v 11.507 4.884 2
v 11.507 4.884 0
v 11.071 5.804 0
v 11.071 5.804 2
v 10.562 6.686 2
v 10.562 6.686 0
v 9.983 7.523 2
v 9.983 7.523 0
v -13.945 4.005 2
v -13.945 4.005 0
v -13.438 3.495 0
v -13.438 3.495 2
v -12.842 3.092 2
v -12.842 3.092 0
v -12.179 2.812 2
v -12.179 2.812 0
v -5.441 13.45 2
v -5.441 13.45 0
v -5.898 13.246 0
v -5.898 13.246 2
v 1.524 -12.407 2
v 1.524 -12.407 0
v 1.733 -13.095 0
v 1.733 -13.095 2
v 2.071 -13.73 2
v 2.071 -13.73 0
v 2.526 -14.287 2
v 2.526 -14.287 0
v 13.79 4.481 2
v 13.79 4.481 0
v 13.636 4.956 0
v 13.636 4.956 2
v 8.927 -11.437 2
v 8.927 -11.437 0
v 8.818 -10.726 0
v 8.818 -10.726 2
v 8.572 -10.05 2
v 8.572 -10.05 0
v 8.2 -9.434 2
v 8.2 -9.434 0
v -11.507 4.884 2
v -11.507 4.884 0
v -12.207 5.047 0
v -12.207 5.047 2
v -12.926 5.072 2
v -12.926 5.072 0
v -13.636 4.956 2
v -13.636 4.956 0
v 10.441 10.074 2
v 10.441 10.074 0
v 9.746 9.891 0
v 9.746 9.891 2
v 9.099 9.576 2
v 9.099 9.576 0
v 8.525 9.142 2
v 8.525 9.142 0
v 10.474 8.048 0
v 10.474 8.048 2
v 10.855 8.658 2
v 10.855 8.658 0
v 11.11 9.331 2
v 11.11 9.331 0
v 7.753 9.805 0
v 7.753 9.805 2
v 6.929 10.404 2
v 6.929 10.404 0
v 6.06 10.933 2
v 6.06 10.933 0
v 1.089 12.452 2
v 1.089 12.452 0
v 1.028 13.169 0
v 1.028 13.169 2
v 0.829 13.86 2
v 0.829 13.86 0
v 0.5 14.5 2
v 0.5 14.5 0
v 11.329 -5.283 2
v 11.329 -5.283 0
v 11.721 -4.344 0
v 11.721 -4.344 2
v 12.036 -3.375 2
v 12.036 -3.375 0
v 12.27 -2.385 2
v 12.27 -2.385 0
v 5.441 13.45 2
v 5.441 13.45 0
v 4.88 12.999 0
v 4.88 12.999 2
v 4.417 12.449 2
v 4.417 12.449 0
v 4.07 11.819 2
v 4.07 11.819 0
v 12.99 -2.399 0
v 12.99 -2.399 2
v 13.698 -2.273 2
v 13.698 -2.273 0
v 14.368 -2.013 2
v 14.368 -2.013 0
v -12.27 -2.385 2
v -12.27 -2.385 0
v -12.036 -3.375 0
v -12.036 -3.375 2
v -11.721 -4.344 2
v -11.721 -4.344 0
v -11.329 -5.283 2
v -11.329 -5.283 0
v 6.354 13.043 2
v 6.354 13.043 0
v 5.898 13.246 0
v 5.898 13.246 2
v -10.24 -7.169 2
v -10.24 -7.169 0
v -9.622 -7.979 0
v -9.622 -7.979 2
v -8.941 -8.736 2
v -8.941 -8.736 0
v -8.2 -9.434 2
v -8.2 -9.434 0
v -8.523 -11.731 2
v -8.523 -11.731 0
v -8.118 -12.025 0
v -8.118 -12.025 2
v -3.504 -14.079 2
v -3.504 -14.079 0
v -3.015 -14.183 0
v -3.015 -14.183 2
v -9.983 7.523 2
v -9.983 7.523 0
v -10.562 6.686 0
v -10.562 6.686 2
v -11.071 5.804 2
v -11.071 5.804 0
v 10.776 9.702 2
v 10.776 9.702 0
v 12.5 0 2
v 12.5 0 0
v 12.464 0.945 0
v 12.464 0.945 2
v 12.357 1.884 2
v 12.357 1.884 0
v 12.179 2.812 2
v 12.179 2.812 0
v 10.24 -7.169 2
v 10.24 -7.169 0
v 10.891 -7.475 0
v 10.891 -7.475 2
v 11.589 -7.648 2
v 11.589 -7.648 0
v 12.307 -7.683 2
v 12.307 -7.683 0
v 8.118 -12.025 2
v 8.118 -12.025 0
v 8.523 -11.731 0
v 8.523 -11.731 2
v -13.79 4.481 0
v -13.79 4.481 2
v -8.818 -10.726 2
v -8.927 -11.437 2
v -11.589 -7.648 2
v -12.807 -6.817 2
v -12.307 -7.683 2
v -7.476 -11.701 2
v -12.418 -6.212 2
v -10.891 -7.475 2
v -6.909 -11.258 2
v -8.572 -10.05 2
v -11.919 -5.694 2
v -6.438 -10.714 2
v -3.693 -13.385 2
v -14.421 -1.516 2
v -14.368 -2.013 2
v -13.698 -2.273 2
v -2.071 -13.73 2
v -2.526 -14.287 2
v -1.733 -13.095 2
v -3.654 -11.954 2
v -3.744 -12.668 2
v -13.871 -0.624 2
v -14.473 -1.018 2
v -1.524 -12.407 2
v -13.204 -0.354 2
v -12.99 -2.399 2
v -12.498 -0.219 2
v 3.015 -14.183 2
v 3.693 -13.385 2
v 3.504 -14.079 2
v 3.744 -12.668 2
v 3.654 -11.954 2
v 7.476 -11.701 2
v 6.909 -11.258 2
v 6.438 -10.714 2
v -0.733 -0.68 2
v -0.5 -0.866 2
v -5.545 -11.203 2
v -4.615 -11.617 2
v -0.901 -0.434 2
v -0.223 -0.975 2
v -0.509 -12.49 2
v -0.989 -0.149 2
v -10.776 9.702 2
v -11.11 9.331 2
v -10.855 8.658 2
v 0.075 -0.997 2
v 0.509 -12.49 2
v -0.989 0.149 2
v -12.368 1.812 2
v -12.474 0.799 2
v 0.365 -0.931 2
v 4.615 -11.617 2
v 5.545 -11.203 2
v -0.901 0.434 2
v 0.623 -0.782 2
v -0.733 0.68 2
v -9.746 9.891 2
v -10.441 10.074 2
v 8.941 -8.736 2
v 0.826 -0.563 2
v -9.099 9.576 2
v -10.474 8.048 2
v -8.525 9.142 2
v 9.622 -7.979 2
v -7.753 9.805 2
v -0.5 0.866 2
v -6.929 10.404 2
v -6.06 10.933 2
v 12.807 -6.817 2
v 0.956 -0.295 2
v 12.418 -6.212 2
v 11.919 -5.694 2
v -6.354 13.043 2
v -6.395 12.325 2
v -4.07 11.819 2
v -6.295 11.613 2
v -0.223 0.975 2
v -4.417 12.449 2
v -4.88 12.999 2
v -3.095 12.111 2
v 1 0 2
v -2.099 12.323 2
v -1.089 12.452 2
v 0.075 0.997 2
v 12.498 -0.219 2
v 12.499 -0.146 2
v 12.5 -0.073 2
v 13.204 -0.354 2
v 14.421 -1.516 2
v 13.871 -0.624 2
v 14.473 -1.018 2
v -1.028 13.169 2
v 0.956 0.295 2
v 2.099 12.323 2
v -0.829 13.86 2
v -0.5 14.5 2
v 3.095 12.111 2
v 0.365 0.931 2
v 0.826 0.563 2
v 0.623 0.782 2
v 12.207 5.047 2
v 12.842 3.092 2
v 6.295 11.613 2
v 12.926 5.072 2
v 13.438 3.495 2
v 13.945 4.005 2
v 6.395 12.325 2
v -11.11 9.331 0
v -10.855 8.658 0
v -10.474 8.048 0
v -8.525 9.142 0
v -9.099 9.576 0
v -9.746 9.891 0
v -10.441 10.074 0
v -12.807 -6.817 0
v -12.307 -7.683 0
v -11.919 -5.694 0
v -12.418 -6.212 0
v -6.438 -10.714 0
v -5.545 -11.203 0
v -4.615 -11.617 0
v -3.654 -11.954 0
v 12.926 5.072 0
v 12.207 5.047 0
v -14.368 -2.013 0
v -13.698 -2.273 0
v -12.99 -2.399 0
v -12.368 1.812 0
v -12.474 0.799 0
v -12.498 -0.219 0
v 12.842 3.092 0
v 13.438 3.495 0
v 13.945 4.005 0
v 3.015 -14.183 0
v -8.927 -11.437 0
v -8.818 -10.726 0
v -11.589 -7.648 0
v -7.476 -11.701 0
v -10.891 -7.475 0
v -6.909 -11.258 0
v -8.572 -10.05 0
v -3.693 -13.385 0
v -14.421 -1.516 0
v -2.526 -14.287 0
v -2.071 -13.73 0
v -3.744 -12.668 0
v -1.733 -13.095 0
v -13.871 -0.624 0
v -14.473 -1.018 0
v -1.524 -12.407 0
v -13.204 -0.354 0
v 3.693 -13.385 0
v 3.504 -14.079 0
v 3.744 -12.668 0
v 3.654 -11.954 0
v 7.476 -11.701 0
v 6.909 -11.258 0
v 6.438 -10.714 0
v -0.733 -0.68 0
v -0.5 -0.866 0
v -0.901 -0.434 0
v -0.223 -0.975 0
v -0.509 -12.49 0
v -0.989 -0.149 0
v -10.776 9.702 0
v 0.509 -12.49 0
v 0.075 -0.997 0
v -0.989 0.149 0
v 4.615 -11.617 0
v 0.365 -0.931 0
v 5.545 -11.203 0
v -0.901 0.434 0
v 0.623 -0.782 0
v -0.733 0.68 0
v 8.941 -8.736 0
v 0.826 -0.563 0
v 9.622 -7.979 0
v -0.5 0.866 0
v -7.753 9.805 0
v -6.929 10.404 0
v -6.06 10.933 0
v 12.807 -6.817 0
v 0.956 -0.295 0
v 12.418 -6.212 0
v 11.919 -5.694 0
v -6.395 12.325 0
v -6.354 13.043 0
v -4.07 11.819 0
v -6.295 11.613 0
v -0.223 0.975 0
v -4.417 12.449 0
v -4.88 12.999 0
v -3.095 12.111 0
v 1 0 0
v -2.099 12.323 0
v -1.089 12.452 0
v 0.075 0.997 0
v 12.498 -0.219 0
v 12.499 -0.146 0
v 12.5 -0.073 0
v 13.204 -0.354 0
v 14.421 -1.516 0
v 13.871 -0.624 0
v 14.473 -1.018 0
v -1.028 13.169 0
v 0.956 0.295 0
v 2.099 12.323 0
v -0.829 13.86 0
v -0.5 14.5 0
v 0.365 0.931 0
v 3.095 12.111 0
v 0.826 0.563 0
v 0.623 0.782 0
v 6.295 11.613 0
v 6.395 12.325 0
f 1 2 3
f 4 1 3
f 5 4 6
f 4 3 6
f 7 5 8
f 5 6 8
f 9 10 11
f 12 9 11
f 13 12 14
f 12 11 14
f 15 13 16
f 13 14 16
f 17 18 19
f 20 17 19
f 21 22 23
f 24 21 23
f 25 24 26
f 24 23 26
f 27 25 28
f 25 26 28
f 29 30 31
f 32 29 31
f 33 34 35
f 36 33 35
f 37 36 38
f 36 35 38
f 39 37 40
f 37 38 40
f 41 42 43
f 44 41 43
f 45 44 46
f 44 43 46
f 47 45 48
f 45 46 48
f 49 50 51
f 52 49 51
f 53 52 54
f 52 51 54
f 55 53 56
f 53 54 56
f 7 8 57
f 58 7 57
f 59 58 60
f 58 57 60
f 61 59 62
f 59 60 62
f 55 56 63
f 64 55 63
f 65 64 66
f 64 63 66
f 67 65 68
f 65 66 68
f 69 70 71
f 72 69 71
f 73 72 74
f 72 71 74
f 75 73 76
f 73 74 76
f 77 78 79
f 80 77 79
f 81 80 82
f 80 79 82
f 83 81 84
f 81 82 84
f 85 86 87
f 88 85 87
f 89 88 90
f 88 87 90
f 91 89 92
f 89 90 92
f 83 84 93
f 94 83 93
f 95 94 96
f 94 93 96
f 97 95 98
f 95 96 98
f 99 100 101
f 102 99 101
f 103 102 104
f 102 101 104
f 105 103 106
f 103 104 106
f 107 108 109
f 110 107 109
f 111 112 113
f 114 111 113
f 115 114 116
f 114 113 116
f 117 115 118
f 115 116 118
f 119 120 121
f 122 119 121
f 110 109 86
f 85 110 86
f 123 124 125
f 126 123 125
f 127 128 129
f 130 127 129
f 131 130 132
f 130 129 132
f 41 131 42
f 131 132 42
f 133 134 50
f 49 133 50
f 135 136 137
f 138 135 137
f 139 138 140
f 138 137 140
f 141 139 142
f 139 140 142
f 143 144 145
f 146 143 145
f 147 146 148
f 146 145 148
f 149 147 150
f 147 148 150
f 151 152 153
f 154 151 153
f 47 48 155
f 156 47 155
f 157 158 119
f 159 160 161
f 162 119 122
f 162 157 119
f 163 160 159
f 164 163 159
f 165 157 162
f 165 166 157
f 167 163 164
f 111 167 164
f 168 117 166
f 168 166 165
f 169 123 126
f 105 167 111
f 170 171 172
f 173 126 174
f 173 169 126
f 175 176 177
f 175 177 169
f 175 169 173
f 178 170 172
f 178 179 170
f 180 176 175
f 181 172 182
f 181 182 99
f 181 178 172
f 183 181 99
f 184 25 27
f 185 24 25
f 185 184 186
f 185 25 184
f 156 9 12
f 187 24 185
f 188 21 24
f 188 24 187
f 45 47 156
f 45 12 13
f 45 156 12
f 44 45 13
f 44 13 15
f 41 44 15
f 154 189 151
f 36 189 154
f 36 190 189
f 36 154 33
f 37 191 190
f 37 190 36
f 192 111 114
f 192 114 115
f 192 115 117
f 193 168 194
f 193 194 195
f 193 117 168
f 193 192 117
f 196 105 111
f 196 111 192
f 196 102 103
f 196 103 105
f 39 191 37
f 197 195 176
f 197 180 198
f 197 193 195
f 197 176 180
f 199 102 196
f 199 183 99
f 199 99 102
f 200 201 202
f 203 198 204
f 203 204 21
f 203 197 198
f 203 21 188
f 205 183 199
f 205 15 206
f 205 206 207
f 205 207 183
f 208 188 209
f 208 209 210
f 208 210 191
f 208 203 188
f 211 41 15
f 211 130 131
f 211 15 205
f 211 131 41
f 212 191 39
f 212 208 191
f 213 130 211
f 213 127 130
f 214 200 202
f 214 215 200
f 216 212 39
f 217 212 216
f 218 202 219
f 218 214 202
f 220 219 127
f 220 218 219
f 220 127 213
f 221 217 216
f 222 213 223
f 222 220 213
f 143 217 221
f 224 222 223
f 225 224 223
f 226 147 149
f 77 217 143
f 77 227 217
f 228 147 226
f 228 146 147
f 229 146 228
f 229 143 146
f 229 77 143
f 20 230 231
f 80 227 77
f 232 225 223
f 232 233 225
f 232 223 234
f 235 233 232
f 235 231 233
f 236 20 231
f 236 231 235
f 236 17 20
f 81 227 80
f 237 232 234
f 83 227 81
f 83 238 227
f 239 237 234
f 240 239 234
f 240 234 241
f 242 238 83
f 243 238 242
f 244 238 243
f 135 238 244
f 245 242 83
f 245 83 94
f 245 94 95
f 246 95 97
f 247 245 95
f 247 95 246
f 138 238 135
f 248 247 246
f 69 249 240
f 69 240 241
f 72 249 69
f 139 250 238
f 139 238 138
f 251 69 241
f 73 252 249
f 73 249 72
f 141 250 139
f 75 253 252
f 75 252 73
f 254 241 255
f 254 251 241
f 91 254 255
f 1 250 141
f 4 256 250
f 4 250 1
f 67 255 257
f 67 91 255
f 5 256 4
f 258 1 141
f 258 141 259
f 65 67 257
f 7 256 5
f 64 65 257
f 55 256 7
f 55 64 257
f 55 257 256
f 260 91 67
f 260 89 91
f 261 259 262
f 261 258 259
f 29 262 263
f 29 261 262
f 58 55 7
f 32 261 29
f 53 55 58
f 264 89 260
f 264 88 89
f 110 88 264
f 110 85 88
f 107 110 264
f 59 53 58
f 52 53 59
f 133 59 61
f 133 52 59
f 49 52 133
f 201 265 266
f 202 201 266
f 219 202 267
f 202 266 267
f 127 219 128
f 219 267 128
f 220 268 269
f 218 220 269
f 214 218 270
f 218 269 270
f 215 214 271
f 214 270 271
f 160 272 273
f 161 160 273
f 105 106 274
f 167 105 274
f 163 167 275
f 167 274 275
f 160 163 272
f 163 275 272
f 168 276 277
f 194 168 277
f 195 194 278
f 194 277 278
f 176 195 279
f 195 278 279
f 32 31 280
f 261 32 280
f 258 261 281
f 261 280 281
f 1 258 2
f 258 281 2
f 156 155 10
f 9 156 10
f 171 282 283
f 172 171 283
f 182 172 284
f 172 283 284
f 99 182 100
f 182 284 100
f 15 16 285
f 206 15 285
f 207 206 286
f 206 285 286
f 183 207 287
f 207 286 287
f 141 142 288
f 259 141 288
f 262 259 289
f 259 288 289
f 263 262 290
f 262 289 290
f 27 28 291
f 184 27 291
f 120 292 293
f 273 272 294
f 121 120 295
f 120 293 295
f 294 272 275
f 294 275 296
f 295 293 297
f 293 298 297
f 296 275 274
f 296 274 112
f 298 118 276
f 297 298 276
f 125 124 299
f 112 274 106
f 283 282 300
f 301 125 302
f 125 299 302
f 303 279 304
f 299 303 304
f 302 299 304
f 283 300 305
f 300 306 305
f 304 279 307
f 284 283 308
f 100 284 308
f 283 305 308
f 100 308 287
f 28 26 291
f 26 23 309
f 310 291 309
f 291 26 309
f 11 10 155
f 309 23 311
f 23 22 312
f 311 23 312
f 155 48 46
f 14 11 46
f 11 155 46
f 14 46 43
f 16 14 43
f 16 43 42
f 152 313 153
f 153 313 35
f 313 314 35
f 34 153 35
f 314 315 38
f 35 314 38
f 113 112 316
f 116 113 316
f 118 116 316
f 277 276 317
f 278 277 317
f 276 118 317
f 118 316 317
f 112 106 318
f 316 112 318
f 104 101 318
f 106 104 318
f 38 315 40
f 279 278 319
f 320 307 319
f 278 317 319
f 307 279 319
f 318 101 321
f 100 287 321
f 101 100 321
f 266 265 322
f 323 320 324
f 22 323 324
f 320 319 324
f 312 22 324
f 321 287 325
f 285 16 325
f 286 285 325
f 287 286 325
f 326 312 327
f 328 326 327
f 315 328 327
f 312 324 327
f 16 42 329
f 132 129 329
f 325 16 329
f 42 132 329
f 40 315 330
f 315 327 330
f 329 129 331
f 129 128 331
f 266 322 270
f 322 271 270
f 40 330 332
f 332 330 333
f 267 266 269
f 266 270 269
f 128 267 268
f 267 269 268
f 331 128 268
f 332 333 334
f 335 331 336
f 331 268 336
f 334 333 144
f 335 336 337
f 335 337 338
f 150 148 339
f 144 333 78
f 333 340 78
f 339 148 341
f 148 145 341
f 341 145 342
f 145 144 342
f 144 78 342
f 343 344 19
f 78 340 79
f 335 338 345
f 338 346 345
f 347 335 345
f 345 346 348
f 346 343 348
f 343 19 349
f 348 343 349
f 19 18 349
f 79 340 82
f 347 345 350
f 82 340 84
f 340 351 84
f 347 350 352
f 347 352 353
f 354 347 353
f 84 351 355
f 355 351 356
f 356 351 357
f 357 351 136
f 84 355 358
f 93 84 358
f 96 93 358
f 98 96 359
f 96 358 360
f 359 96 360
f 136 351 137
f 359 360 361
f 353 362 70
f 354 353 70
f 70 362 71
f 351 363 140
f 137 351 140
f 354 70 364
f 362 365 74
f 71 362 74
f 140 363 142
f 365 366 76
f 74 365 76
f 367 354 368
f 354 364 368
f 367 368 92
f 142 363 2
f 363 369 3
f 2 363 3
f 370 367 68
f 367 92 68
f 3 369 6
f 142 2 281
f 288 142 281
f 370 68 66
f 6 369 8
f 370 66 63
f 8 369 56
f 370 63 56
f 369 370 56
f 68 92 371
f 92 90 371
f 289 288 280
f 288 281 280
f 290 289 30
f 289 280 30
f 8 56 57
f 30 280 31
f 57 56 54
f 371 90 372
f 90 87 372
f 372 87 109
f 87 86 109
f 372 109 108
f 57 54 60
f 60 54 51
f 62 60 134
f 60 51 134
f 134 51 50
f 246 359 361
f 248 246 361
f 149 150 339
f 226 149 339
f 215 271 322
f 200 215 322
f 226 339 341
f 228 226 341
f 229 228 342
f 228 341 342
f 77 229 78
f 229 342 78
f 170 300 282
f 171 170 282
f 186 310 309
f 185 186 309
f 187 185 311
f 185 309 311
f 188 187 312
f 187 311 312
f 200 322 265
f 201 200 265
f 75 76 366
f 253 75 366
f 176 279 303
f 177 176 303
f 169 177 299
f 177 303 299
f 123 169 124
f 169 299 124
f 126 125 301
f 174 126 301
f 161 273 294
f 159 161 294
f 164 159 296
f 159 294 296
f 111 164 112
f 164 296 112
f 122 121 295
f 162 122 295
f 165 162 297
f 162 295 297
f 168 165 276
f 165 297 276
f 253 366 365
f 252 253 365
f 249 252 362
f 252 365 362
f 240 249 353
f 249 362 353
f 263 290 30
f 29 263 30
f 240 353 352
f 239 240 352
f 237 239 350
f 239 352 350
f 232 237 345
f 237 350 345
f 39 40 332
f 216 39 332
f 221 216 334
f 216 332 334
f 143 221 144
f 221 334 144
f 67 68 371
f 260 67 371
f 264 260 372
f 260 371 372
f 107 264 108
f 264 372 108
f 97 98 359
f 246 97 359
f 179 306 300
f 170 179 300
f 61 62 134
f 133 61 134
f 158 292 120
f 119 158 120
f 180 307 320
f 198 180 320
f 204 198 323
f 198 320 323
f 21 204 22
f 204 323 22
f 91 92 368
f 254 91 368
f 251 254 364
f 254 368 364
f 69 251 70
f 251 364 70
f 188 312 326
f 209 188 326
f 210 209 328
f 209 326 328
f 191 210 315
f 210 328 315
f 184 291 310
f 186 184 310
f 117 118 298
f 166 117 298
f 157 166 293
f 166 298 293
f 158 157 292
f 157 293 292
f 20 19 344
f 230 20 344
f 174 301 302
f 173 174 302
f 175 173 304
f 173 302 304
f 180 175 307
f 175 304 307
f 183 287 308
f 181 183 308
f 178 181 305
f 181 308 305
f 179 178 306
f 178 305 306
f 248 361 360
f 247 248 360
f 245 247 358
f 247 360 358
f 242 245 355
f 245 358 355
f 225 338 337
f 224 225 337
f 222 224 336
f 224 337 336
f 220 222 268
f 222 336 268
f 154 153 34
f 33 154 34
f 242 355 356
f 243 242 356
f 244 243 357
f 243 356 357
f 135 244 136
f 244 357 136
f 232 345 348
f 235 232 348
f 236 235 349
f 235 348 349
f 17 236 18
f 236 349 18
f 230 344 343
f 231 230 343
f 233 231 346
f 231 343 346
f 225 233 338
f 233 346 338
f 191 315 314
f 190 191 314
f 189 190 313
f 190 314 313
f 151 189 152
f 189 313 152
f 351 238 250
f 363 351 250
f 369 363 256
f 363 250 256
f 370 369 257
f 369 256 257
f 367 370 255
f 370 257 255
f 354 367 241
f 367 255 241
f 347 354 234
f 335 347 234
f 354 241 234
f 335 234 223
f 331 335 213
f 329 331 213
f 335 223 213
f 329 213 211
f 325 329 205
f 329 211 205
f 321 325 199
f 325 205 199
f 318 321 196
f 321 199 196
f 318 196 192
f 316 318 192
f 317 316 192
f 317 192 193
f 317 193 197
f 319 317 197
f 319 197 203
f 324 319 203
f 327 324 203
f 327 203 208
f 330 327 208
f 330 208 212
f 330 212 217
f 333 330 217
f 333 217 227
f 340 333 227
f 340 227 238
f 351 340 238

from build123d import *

# Parameters (mm, degrees)
F1_DEPTH = 2
F2_R     = 1
F3_DEPTH = 2.001


with BuildPart() as f1:
    # F0 (on Top) → F1 (new body)
    with BuildSketch(Plane.XY):
        with BuildLine():
            ThreePointArc((12.498086, -0.218737), (12.499521, -0.109373), (12.5, 0))
            ThreePointArc((12.5, 0), (12.419615, 1.415329), (12.179495, 2.812455))
            ThreePointArc((12.179495, 2.812455), (11.888206, 3.862712), (11.506538, 4.883604))
            ThreePointArc((11.506538, 4.883604), (10.825318, 6.25), (9.982594, 7.523152))
            ThreePointArc((9.982594, 7.523152), (9.28931, 8.364133), (8.525405, 9.141525))
            ThreePointArc((8.525405, 9.141525), (7.347316, 10.112712), (6.059612, 10.933028))
            ThreePointArc((6.059612, 10.933028), (5.084208, 11.419318), (4.070152, 11.818793))
            ThreePointArc((4.070152, 11.818793), (2.598896, 12.226845), (1.088867, 12.452484))
            ThreePointArc((1.088867, 12.452484), (0, 12.5), (-1.088867, 12.452484))
            ThreePointArc((-1.088867, 12.452484), (-2.598896, 12.226845), (-4.070152, 11.818793))
            ThreePointArc((-4.070152, 11.818793), (-5.084208, 11.419318), (-6.059612, 10.933028))
            ThreePointArc((-6.059612, 10.933028), (-7.347316, 10.112712), (-8.525405, 9.141525))
            ThreePointArc((-8.525405, 9.141525), (-9.28931, 8.364133), (-9.982594, 7.523152))
            ThreePointArc((-9.982594, 7.523152), (-10.825318, 6.25), (-11.506538, 4.883604))
            ThreePointArc((-11.506538, 4.883604), (-11.888206, 3.862712), (-12.179495, 2.812455))
            ThreePointArc((-12.179495, 2.812455), (-12.431524, 1.306606), (-12.498086, -0.218737))
            ThreePointArc((-12.498086, -0.218737), (-12.431524, -1.306606), (-12.270451, -2.384541))
            ThreePointArc((-12.270451, -2.384541), (-11.888206, -3.862712), (-11.328602, -5.283255))
            ThreePointArc((-11.328602, -5.283255), (-10.825318, -6.25), (-10.239734, -7.169229))
            ThreePointArc((-10.239734, -7.169229), (-9.28931, -8.364133), (-8.200299, -9.434251))
            ThreePointArc((-8.200299, -9.434251), (-7.347316, -10.112712), (-6.438475, -10.714292))
            ThreePointArc((-6.438475, -10.714292), (-5.084208, -11.419318), (-3.65409, -11.953979))
            ThreePointArc((-3.65409, -11.953979), (-2.598896, -12.226845), (-1.523944, -12.406756))
            ThreePointArc((-1.523944, -12.406756), (0, -12.5), (1.523944, -12.406756))
            ThreePointArc((1.523944, -12.406756), (2.598896, -12.226845), (3.65409, -11.953979))
            ThreePointArc((3.65409, -11.953979), (5.084208, -11.419318), (6.438475, -10.714292))
            ThreePointArc((6.438475, -10.714292), (7.347316, -10.112712), (8.200299, -9.434251))
            ThreePointArc((8.200299, -9.434251), (9.28931, -8.364133), (10.239734, -7.169229))
            ThreePointArc((10.239734, -7.169229), (10.825318, -6.25), (11.328602, -5.283255))
            ThreePointArc((11.328602, -5.283255), (11.888206, -3.862712), (12.270451, -2.384541))
            ThreePointArc((12.270451, -2.384541), (12.431524, -1.306606), (12.498086, -0.218737))
        make_face()
        with BuildLine():
            ThreePointArc((11.506538, 4.883604), (11.888206, 3.862712), (12.179495, 2.812455))
            ThreePointArc((12.179495, 2.812455), (13.150138, 3.278627), (13.944828, 4.005218))
            Line((13.944828, 4.005218), (13.790319, 4.480746))
            Line((13.790319, 4.480746), (13.635811, 4.956275))
            ThreePointArc((13.635811, 4.956275), (12.565814, 5.076992), (11.506538, 4.883604))
        make_face()
        with BuildLine():
            ThreePointArc((14.472832, -1.018402), (13.544441, -0.472914), (12.498086, -0.218737))
            ThreePointArc((12.498086, -0.218737), (12.431524, -1.306606), (12.270451, -2.384541))
            ThreePointArc((12.270451, -2.384541), (13.346787, -2.353468), (14.368303, -2.012924))
            Line((14.368303, -2.012924), (14.420567, -1.515663))
            Line((14.420567, -1.515663), (14.472832, -1.018402))
        make_face()
        with BuildLine():
            ThreePointArc((8.525405, 9.141525), (9.28931, 8.364133), (9.982594, 7.523152))
            ThreePointArc((9.982594, 7.523152), (10.679711, 8.343818), (11.110165, 9.330821))
            Line((11.110165, 9.330821), (10.7756, 9.702394))
            Line((10.7756, 9.702394), (10.441035, 10.073966))
            ThreePointArc((10.441035, 10.073966), (9.414444, 9.74904), (8.525405, 9.141525))
        make_face()
        with BuildLine():
            ThreePointArc((12.807368, -6.816987), (12.181111, -5.941049), (11.328602, -5.283255))
            ThreePointArc((11.328602, -5.283255), (10.825318, -6.25), (10.239734, -7.169229))
            ThreePointArc((10.239734, -7.169229), (11.235655, -7.578627), (12.307368, -7.683013))
            Line((12.307368, -7.683013), (12.557368, -7.25))
            Line((12.557368, -7.25), (12.807368, -6.816987))
        make_face()
        with BuildLine():
            ThreePointArc((4.070152, 11.818793), (5.084208, 11.419318), (6.059612, 10.933028))
            ThreePointArc((6.059612, 10.933028), (6.362665, 11.966287), (6.354454, 13.043041))
            Line((6.354454, 13.043041), (5.897681, 13.246409))
            Line((5.897681, 13.246409), (5.440909, 13.449777))
            ThreePointArc((5.440909, 13.449777), (4.635231, 12.735391), (4.070152, 11.818793))
        make_face()
        with BuildLine():
            ThreePointArc((8.927395, -11.436854), (8.711557, -10.381923), (8.200299, -9.434251))
            ThreePointArc((8.200299, -9.434251), (7.347316, -10.112712), (6.438475, -10.714292))
            ThreePointArc((6.438475, -10.714292), (7.181776, -11.493373), (8.118378, -12.024639))
            Line((8.118378, -12.024639), (8.522886, -11.730746))
            Line((8.522886, -11.730746), (8.927395, -11.436854))
        make_face()
        with BuildLine():
            ThreePointArc((-1.088867, 12.452484), (0, 12.5), (1.088867, 12.452484))
            ThreePointArc((1.088867, 12.452484), (0.945456, 13.519676), (0.5, 14.5))
            Line((0.5, 14.5), (0, 14.5))
            Line((0, 14.5), (-0.5, 14.5))
            ThreePointArc((-0.5, 14.5), (-0.945456, 13.519676), (-1.088867, 12.452484))
        make_face()
        with BuildLine():
            ThreePointArc((3.503793, -14.079184), (3.735695, -13.027668), (3.65409, -11.953979))
            ThreePointArc((3.65409, -11.953979), (2.598896, -12.226845), (1.523944, -12.406756))
            ThreePointArc((1.523944, -12.406756), (1.886103, -13.42081), (2.525646, -14.287096))
            Line((2.525646, -14.287096), (3.01472, -14.18314))
            Line((3.01472, -14.18314), (3.503793, -14.079184))
        make_face()
        with BuildLine():
            ThreePointArc((-6.059612, 10.933028), (-5.084208, 11.419318), (-4.070152, 11.818793))
            ThreePointArc((-4.070152, 11.818793), (-4.635231, 12.735391), (-5.440909, 13.449777))
            Line((-5.440909, 13.449777), (-5.897681, 13.246409))
            Line((-5.897681, 13.246409), (-6.354454, 13.043041))
            ThreePointArc((-6.354454, 13.043041), (-6.362665, 11.966287), (-6.059612, 10.933028))
        make_face()
        with BuildLine():
            ThreePointArc((-2.525646, -14.287096), (-1.886103, -13.42081), (-1.523944, -12.406756))
            ThreePointArc((-1.523944, -12.406756), (-2.598896, -12.226845), (-3.65409, -11.953979))
            ThreePointArc((-3.65409, -11.953979), (-3.735695, -13.027668), (-3.503793, -14.079184))
            Line((-3.503793, -14.079184), (-3.01472, -14.18314))
            Line((-3.01472, -14.18314), (-2.525646, -14.287096))
        make_face()
        with BuildLine():
            ThreePointArc((-9.982594, 7.523152), (-9.28931, 8.364133), (-8.525405, 9.141525))
            ThreePointArc((-8.525405, 9.141525), (-9.414444, 9.74904), (-10.441035, 10.073966))
            Line((-10.441035, 10.073966), (-10.7756, 9.702394))
            Line((-10.7756, 9.702394), (-11.110165, 9.330821))
            ThreePointArc((-11.110165, 9.330821), (-10.679711, 8.343818), (-9.982594, 7.523152))
        make_face()
        with BuildLine():
            ThreePointArc((-8.118378, -12.024639), (-7.181776, -11.493373), (-6.438475, -10.714292))
            ThreePointArc((-6.438475, -10.714292), (-7.347316, -10.112712), (-8.200299, -9.434251))
            ThreePointArc((-8.200299, -9.434251), (-8.711557, -10.381923), (-8.927395, -11.436854))
            Line((-8.927395, -11.436854), (-8.522886, -11.730746))
            Line((-8.522886, -11.730746), (-8.118378, -12.024639))
        make_face()
        with BuildLine():
            ThreePointArc((-12.179495, 2.812455), (-11.888206, 3.862712), (-11.506538, 4.883604))
            ThreePointArc((-11.506538, 4.883604), (-12.565814, 5.076992), (-13.635811, 4.956275))
            Line((-13.635811, 4.956275), (-13.790319, 4.480746))
            Line((-13.790319, 4.480746), (-13.944828, 4.005218))
            ThreePointArc((-13.944828, 4.005218), (-13.150138, 3.278627), (-12.179495, 2.812455))
        make_face()
        with BuildLine():
            ThreePointArc((-12.307368, -7.683013), (-11.235655, -7.578627), (-10.239734, -7.169229))
            ThreePointArc((-10.239734, -7.169229), (-10.825318, -6.25), (-11.328602, -5.283255))
            ThreePointArc((-11.328602, -5.283255), (-12.181111, -5.941049), (-12.807368, -6.816987))
            Line((-12.807368, -6.816987), (-12.557368, -7.25))
            Line((-12.557368, -7.25), (-12.307368, -7.683013))
        make_face()
        with BuildLine():
            ThreePointArc((-12.270451, -2.384541), (-12.431524, -1.306606), (-12.498086, -0.218737))
            ThreePointArc((-12.498086, -0.218737), (-13.544441, -0.472914), (-14.472832, -1.018402))
            Line((-14.472832, -1.018402), (-14.420567, -1.515663))
            Line((-14.420567, -1.515663), (-14.368303, -2.012924))
            ThreePointArc((-14.368303, -2.012924), (-13.346787, -2.353468), (-12.270451, -2.384541))
        make_face()
    extrude(amount=F1_DEPTH)

    # F2 (on face) → F3 (cut, through all)
    with BuildSketch(Plane.XY.offset(2)):
        Circle(F2_R)
    extrude(amount=-F3_DEPTH, mode=Mode.SUBTRACT)


solid = f1.part
